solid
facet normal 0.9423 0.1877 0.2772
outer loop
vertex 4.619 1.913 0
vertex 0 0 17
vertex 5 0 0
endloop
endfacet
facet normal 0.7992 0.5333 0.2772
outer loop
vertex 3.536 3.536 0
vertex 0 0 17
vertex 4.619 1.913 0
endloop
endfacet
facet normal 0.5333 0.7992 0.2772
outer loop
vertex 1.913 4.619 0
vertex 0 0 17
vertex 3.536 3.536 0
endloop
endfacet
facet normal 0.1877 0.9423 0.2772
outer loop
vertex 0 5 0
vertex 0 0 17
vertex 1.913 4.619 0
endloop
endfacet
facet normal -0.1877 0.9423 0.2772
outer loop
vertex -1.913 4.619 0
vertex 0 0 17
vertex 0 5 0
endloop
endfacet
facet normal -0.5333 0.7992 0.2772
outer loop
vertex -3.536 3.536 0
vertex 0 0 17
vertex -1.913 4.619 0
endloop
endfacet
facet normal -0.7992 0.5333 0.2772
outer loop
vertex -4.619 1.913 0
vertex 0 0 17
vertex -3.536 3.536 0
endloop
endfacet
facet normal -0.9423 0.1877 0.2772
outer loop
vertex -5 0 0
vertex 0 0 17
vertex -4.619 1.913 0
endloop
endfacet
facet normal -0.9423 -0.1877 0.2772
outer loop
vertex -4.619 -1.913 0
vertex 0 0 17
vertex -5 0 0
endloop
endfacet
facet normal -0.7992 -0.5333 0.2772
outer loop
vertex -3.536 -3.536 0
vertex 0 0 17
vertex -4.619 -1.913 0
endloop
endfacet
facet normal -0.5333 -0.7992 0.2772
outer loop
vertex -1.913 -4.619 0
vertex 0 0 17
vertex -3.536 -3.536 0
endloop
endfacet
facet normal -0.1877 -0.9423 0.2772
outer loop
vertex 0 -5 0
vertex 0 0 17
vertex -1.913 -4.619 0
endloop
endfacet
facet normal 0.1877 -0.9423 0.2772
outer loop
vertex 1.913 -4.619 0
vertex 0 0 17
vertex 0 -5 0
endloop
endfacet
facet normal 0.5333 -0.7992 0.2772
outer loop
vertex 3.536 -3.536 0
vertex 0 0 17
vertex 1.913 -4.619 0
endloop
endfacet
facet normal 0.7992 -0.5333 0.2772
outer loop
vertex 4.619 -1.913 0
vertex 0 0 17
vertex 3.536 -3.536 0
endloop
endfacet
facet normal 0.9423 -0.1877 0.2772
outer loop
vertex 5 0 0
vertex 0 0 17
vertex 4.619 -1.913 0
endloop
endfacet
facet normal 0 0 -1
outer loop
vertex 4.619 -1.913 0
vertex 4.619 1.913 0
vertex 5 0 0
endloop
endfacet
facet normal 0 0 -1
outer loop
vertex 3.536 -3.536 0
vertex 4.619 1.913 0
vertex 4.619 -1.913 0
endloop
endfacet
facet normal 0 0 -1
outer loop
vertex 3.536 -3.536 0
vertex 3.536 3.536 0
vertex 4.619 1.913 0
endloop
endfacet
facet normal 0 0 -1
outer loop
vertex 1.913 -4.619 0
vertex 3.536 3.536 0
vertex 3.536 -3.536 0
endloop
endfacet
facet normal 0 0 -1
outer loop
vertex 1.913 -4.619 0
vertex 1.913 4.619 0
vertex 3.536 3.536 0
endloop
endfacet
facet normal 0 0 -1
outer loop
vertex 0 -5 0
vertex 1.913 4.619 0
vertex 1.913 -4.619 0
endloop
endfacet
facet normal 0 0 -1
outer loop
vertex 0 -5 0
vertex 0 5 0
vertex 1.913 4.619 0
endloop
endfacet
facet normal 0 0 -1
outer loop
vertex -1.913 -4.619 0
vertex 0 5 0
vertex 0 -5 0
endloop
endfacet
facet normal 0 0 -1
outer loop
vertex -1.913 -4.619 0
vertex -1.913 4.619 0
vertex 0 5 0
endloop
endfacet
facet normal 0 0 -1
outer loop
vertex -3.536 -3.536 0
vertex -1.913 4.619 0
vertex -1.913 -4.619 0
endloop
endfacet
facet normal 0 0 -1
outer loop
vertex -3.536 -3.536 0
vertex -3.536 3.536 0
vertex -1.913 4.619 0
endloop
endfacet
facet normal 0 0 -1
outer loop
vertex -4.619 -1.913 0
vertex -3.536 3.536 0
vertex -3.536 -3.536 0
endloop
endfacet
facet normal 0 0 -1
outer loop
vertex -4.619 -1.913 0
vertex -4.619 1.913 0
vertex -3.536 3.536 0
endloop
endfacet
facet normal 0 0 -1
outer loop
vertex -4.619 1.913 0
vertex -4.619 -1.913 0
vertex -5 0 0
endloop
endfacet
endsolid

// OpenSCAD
// Generated by SolidPython 1.0.1 on 2020-07-29 00:46:43


cylinder(h = 17, r1 = 5, r2 = 0);
/***********************************************
*********      SolidPython code:      **********
************************************************
 
# import packages: SolidPython
from solid import *
from solid.utils import *
from itertools import chain, combinations, permutations


class Resize:

    def __init__(self, scad_file):
        self.scad_file = scad_file
        #self.scad_file = import_scad(scad_file)
        # cone/cylinder param:
        self.r1 = 0
        self.r2 = 0
        self.h = 0
        # rectangular prism param:
        self.w = 0
        self.l = 0
        # ellipse param:
        self.r = 0

    # import OpenScad code (file name corresponds to shape)


    # classify shape + parameters
    def assign(self, param1, param2, param3):
        if self.scad_file == 'cone.scad':
            self.r1 = param1
            self.r2 = param2
            self.h = param3
        elif self.scad_file == 'cylinder.scad':
            self.r1 = param1
            self.r2 = param2
            self.h = param3
        elif self.scad_file == 'rectangularPrism.scad':
            self.h = param1
            self.l = param2
            self.w = param3
        else:
            self.r = param1
            self.h = param2

    # resize parameters
    def iterate(self):
        x = range(3, 20, 2)
        i = 1
        if self.scad_file == 'cone.scad':
            tempList = list(permutations(x, 2))
            for temp in tempList:
                param1 = temp[0]
                param2 = temp[1]
                filepath = 'produced_scad_files/' + 'cone' + str(param1) + '_' + str(param2) + '_' + '.scad'
                scad_render_to_file(cylinder(h=param1, r1=param2, r2=0), filepath)

        elif self.scad_file == 'cylinder.scad':
            tempList = list(permutations(x, 3))
            for temp in tempList:
                param1 = temp[0]
                param2 = temp[1]
                filepath = 'produced_scad_files/' + 'cylinder' + str(param1) + '_' + str(param2) + '_' + '.scad'
                scad_render_to_file(cylinder(h=param1, r1=param2, r2=param2), filepath)

        elif self.scad_file == 'rectangularPrism.scad':
            tempList = list(permutations(x, 3))
            for temp in tempList:
                param1 = temp[0]
                param2 = temp[1]
                param3 = temp[2]
                filepath = 'produced_scad_files/' + 'rectangularPrism' + str(param1) + '_' + str(param2) + '_' + str(
                    param3) + '.scad'
                scad_render_to_file(cube(size=(param1, param2, param3)), filepath)

        elif self.scad_file == 'ellipse.scad':
            tempList = list(permutations(x, 4))
            for temp in tempList:
                param1 = temp[0]
                param2 = temp[1]
                param3 = temp[2]
                param4 = temp[3]
                filepath = 'produced_scad_files/' + 'ellipse' + str(param1) + '_' + str(param2) + '_' + str(param3) + '_' + str(param4) + '.scad'
                scad_render_to_file(scale([param1, param2, param3])(sphere(r=param4)), filepath)

    def render_to_scadfile(self):
        scad_render_to_file(scad, 'example.scad') 
 
************************************************/
